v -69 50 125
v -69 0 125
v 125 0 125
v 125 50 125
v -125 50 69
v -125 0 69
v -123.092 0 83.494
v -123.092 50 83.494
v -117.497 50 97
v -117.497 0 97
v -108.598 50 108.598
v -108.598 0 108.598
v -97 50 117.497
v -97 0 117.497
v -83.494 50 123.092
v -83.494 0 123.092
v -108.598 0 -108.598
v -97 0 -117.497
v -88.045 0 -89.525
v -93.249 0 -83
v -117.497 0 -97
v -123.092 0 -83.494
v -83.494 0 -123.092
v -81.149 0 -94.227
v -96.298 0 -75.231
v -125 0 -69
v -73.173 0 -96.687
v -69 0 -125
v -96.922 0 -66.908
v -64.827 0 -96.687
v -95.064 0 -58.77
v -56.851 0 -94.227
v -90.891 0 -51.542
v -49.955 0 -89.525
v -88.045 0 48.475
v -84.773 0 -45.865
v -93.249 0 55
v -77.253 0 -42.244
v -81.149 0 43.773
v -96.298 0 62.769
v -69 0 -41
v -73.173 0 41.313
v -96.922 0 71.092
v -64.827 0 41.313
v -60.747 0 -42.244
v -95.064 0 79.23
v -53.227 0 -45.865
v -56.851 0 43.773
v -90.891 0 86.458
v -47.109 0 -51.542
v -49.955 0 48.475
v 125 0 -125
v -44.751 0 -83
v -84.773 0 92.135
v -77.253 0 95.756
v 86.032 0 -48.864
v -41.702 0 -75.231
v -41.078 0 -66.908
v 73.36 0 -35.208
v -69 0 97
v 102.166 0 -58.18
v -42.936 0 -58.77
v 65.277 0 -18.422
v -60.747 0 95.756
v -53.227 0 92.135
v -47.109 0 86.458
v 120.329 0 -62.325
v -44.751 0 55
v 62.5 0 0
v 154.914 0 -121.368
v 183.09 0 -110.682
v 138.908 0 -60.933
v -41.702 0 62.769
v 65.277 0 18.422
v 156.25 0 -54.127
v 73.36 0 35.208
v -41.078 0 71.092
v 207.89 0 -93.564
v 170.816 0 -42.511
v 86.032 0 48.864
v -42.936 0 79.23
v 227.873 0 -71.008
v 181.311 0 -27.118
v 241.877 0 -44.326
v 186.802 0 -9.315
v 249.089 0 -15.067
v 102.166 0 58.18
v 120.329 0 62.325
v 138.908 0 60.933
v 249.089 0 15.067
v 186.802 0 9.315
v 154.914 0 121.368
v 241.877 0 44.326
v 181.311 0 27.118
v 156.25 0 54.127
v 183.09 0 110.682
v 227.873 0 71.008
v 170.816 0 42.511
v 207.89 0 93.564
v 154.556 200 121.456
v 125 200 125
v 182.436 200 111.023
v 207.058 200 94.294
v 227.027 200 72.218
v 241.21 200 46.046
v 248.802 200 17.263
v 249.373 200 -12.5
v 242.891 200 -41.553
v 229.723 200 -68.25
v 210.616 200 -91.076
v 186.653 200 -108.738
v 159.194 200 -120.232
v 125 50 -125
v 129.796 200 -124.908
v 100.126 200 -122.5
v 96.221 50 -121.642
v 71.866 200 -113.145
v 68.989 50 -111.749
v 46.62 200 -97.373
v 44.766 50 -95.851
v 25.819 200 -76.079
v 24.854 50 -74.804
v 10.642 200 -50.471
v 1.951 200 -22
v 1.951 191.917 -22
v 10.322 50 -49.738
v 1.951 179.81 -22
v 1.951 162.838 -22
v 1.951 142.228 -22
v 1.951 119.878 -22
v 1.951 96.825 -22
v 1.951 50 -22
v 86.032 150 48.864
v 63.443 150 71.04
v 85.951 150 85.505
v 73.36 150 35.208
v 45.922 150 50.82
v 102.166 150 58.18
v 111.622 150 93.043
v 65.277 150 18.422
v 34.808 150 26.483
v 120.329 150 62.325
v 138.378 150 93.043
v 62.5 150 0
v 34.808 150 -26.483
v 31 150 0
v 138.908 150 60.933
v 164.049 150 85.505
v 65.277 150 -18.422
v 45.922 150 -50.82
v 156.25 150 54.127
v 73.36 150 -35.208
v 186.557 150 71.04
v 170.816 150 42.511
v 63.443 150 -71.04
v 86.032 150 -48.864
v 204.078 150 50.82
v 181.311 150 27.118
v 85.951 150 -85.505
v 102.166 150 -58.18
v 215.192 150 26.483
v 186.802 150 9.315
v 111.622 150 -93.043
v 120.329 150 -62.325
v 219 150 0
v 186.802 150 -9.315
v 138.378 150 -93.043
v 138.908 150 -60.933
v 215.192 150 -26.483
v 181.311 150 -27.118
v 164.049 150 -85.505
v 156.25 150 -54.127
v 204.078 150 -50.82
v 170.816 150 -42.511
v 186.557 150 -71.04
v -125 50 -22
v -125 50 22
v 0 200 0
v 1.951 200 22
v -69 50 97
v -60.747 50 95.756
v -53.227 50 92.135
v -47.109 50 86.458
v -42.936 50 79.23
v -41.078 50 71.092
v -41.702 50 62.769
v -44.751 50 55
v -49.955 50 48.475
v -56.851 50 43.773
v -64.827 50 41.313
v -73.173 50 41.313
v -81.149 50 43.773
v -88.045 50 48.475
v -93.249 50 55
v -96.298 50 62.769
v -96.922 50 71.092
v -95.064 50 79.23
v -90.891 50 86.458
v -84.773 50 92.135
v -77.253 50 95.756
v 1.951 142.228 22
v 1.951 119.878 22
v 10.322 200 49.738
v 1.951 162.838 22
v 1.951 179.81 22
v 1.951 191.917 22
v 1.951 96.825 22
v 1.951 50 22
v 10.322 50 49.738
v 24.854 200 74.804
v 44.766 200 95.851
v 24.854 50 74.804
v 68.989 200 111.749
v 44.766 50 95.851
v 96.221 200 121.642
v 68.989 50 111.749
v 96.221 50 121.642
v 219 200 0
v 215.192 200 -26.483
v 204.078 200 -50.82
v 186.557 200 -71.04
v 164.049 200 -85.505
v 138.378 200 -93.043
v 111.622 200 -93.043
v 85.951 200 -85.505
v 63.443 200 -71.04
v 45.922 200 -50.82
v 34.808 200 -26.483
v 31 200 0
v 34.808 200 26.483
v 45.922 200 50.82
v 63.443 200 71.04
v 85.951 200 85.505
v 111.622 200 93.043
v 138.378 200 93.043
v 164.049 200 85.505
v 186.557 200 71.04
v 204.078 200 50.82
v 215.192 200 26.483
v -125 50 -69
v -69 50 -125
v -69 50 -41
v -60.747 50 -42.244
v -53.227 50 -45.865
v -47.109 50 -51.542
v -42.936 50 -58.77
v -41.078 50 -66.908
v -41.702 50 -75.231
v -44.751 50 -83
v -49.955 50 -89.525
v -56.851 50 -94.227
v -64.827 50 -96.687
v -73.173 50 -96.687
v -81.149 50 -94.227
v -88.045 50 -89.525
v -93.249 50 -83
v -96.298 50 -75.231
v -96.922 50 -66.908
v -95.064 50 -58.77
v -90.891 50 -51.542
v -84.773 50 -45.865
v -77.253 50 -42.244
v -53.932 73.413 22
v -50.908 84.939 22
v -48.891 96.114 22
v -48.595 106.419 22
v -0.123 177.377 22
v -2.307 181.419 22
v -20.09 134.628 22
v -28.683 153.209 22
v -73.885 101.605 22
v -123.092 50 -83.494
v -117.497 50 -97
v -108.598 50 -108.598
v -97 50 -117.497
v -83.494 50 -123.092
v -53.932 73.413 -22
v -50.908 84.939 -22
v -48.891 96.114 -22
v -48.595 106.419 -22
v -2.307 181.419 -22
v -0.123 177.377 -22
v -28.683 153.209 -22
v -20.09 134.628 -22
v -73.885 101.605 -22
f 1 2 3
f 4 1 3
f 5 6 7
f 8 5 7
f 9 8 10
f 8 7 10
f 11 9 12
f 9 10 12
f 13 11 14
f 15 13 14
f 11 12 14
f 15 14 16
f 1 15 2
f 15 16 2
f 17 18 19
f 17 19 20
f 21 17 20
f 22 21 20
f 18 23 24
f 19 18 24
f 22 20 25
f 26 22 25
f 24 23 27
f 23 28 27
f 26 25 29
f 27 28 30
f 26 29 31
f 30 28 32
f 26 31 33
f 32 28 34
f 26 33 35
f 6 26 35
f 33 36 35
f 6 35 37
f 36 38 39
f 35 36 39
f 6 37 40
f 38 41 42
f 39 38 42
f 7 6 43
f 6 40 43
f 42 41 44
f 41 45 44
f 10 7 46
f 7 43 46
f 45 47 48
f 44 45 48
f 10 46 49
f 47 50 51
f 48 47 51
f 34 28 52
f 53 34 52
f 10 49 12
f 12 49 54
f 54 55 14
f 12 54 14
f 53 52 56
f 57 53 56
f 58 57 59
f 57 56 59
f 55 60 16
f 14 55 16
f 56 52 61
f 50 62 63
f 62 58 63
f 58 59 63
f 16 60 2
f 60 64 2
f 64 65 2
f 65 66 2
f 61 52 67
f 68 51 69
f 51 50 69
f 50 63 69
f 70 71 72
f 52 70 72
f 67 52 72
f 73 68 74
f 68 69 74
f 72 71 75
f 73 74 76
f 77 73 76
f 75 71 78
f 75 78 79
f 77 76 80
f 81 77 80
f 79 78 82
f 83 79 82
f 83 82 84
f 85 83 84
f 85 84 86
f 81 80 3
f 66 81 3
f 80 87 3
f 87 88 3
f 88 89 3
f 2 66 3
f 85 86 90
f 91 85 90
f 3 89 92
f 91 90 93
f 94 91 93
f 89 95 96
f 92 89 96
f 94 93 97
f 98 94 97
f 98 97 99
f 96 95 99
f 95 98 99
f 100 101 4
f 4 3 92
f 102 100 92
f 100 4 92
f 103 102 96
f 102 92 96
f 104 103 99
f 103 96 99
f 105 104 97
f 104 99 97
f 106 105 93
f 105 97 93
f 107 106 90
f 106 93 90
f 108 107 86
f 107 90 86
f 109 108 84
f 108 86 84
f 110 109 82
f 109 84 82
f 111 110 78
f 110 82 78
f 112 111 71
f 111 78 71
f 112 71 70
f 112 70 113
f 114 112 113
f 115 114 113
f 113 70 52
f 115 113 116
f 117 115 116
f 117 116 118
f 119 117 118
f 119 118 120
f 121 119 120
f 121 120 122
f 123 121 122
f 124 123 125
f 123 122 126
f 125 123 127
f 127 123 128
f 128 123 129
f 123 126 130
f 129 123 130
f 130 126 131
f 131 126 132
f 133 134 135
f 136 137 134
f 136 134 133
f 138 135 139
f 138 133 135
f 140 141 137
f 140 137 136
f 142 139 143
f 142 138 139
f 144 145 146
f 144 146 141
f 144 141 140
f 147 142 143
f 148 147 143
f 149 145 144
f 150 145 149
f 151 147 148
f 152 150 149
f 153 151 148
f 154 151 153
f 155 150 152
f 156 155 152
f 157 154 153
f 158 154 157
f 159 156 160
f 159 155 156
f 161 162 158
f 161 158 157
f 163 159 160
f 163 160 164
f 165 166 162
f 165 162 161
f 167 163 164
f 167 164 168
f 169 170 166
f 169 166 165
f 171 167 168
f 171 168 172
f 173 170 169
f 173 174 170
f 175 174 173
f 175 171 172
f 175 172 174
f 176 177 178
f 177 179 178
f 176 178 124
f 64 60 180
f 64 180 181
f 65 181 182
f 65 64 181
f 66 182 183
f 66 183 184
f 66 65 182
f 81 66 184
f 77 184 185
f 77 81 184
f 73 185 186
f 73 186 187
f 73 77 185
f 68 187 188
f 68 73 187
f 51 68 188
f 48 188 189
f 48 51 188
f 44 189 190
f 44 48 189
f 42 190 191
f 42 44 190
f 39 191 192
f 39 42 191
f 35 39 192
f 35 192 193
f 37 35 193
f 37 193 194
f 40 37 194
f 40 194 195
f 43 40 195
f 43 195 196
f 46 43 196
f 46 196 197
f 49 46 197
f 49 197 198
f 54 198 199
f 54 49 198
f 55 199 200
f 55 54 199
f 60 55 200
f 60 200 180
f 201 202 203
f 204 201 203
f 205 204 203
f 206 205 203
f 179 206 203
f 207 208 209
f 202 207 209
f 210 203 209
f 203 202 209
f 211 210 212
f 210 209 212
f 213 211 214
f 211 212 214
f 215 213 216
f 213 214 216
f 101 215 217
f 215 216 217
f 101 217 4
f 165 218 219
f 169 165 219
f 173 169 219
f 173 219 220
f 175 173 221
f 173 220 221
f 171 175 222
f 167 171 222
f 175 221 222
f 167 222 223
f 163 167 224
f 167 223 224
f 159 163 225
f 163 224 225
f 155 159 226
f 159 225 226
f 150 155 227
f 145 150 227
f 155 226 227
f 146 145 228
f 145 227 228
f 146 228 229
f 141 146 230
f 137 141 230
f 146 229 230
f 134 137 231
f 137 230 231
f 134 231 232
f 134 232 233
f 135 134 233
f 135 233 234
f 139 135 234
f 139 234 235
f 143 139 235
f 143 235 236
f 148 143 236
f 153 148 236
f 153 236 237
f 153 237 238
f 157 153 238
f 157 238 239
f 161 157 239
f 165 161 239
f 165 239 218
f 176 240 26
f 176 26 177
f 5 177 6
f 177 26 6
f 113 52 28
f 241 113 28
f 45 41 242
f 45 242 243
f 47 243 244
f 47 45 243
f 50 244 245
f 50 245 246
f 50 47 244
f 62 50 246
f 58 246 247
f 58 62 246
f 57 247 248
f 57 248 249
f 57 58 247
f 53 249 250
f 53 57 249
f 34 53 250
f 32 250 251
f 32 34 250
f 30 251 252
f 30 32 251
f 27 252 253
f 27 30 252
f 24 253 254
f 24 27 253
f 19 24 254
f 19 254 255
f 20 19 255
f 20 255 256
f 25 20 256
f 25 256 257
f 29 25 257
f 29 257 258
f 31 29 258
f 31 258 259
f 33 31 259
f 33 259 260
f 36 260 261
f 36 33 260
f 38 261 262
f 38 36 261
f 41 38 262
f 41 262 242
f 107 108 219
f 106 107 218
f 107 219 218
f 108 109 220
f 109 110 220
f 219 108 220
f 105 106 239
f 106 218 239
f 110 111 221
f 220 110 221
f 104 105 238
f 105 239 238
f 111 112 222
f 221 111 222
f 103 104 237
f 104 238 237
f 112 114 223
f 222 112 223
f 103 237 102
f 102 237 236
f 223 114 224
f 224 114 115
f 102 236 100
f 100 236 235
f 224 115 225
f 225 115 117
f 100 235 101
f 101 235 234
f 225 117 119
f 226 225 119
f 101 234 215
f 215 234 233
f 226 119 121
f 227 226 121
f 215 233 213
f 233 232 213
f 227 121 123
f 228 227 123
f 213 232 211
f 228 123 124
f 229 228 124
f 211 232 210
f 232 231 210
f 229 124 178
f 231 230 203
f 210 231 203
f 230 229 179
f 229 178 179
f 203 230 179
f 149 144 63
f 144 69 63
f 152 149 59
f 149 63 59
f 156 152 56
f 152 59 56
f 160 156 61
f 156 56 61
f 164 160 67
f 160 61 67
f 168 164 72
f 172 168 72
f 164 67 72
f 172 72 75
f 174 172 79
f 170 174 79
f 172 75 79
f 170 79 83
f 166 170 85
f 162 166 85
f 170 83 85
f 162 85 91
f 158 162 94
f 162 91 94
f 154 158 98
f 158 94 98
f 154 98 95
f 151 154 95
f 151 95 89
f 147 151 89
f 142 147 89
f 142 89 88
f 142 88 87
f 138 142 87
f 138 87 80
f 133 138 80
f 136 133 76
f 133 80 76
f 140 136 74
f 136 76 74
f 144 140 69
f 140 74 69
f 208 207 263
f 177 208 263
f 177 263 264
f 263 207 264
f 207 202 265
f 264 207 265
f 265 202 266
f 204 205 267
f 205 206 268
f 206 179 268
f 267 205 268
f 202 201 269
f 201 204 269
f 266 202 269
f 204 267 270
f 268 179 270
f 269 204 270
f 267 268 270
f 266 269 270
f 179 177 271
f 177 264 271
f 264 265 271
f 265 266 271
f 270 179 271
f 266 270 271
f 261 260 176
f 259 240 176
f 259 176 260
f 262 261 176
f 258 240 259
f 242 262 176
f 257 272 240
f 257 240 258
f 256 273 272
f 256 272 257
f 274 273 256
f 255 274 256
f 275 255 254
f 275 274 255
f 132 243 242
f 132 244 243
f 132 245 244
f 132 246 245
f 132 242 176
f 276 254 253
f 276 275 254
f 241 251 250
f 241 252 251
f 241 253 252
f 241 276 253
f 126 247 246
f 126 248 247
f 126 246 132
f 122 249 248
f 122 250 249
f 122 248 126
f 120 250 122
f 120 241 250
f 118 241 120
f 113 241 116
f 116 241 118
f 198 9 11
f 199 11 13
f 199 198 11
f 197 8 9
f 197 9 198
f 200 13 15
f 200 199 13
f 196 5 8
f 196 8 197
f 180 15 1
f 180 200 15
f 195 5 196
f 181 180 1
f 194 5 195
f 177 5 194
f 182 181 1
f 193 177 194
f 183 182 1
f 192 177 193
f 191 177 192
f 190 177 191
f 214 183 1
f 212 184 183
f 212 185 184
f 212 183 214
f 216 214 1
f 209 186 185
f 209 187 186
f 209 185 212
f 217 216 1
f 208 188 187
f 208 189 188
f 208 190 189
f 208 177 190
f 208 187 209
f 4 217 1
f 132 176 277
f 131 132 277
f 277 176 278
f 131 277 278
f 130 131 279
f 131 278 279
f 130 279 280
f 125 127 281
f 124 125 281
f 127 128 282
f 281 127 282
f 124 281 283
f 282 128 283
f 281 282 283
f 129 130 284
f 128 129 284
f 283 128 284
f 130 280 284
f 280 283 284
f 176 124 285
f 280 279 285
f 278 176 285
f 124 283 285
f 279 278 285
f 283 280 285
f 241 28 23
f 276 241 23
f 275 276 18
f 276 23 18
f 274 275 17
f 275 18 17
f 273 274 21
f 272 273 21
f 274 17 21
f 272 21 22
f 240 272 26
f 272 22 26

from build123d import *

# Parameters (mm, degrees)
SKETCH1_R                               = 28
BOSS_EXTRUDE1_DEPTH                     = 50
SKETCH1_3_R                             = 125
BOSS_EXTRUDE2_DEPTH                     = 200
CBORE_FOR_M5_HEX_HEAD_BOLT1_D           = 125
CBORE_FOR_M5_HEX_HEAD_BOLT1_DEPTH       = 200
CBORE_FOR_M5_HEX_HEAD_BOLT1_CBORE_D     = 188
CBORE_FOR_M5_HEX_HEAD_BOLT1_CBORE_DEPTH = 50
CBORE_FOR_M5_HEX_HEAD_BOLT1_TIP         = 36.084391824


with BuildPart() as part:
    # Sketch1 → Boss-Extrude1 (new body)
    with BuildSketch(Plane(origin=(0, 0, 0), x_dir=(1, 0, 0), z_dir=(0, 1, 0))):
        with BuildLine():
            ThreePointArc((-125, -69), (-108.597979746, -108.597979746), (-69, -125))
            Line((-69, -125), (125, -125))
            ThreePointArc((125, -125), (0, 0), (125, 125))
            Line((125, 125), (-69, 125))
            ThreePointArc((-69, 125), (-108.597979746, 108.597979746), (-125, 69))
            Line((-125, 69), (-125, -69))
        make_face()
        with Locations((-69, -69)):
            Circle(SKETCH1_R, mode=Mode.SUBTRACT)
        with Locations((-69, 69)):
            Circle(SKETCH1_R, mode=Mode.SUBTRACT)
    extrude(amount=BOSS_EXTRUDE1_DEPTH)

    # Sketch1<3> → Boss-Extrude2 (add)
    with BuildSketch(Plane(origin=(0, 0, 0), x_dir=(1, 0, 0), z_dir=(0, 1, 0))):
        with Locations((125, 0)):
            Circle(SKETCH1_3_R)
    extrude(amount=BOSS_EXTRUDE2_DEPTH)

    # CBORE for M5 Hex Head Bolt1
    with Locations(Plane(origin=(0, 200, 0), x_dir=(1, 0, 0), z_dir=(0, 1, 0))):
        with Locations((125, 0)):
            CounterBoreHole(CBORE_FOR_M5_HEX_HEAD_BOLT1_D / 2, CBORE_FOR_M5_HEX_HEAD_BOLT1_CBORE_D / 2, CBORE_FOR_M5_HEX_HEAD_BOLT1_CBORE_DEPTH, depth=CBORE_FOR_M5_HEX_HEAD_BOLT1_DEPTH)
            with Locations((0, 0, -(CBORE_FOR_M5_HEX_HEAD_BOLT1_DEPTH + CBORE_FOR_M5_HEX_HEAD_BOLT1_TIP / 2))):  # 120° drill point
                Cone(0, CBORE_FOR_M5_HEX_HEAD_BOLT1_D / 2, CBORE_FOR_M5_HEX_HEAD_BOLT1_TIP, mode=Mode.SUBTRACT)

    # Sketch7 → Loft1 section 0
    with BuildSketch(Plane(origin=(0, 50, 0), x_dir=(1, 0, 0), z_dir=(0, 1, 0))):
        with BuildLine():
            Line((-125, 22), (19.117040025, 22))
            Line((19.117040025, 22), (19.117040025, -22))
            Line((19.117040025, -22), (-125, -22))
            Line((-125, -22), (-125, 22))
        make_face()
    # Sketch6 for Loft1 → Loft1 section 1
    with BuildSketch(Plane(origin=(0, 200, 0), x_dir=(1, 0, 0), z_dir=(0, 1, 0))):
        with BuildLine():
            Line((1.951229181, -22), (26.938517531, -22))
            Line((26.938517531, -22), (26.938517531, 22))
            Line((26.938517531, 22), (1.951229181, 22))
            # circular arc as an exact rational Bezier (weights 1, cos(half-angle), 1)
            Bezier((1.951229181, 22), (-1.982170533, 0), (1.951229181, -22), weights=[1, 0.984390167, 1])
        make_face()
    loft()


solid = part.part
